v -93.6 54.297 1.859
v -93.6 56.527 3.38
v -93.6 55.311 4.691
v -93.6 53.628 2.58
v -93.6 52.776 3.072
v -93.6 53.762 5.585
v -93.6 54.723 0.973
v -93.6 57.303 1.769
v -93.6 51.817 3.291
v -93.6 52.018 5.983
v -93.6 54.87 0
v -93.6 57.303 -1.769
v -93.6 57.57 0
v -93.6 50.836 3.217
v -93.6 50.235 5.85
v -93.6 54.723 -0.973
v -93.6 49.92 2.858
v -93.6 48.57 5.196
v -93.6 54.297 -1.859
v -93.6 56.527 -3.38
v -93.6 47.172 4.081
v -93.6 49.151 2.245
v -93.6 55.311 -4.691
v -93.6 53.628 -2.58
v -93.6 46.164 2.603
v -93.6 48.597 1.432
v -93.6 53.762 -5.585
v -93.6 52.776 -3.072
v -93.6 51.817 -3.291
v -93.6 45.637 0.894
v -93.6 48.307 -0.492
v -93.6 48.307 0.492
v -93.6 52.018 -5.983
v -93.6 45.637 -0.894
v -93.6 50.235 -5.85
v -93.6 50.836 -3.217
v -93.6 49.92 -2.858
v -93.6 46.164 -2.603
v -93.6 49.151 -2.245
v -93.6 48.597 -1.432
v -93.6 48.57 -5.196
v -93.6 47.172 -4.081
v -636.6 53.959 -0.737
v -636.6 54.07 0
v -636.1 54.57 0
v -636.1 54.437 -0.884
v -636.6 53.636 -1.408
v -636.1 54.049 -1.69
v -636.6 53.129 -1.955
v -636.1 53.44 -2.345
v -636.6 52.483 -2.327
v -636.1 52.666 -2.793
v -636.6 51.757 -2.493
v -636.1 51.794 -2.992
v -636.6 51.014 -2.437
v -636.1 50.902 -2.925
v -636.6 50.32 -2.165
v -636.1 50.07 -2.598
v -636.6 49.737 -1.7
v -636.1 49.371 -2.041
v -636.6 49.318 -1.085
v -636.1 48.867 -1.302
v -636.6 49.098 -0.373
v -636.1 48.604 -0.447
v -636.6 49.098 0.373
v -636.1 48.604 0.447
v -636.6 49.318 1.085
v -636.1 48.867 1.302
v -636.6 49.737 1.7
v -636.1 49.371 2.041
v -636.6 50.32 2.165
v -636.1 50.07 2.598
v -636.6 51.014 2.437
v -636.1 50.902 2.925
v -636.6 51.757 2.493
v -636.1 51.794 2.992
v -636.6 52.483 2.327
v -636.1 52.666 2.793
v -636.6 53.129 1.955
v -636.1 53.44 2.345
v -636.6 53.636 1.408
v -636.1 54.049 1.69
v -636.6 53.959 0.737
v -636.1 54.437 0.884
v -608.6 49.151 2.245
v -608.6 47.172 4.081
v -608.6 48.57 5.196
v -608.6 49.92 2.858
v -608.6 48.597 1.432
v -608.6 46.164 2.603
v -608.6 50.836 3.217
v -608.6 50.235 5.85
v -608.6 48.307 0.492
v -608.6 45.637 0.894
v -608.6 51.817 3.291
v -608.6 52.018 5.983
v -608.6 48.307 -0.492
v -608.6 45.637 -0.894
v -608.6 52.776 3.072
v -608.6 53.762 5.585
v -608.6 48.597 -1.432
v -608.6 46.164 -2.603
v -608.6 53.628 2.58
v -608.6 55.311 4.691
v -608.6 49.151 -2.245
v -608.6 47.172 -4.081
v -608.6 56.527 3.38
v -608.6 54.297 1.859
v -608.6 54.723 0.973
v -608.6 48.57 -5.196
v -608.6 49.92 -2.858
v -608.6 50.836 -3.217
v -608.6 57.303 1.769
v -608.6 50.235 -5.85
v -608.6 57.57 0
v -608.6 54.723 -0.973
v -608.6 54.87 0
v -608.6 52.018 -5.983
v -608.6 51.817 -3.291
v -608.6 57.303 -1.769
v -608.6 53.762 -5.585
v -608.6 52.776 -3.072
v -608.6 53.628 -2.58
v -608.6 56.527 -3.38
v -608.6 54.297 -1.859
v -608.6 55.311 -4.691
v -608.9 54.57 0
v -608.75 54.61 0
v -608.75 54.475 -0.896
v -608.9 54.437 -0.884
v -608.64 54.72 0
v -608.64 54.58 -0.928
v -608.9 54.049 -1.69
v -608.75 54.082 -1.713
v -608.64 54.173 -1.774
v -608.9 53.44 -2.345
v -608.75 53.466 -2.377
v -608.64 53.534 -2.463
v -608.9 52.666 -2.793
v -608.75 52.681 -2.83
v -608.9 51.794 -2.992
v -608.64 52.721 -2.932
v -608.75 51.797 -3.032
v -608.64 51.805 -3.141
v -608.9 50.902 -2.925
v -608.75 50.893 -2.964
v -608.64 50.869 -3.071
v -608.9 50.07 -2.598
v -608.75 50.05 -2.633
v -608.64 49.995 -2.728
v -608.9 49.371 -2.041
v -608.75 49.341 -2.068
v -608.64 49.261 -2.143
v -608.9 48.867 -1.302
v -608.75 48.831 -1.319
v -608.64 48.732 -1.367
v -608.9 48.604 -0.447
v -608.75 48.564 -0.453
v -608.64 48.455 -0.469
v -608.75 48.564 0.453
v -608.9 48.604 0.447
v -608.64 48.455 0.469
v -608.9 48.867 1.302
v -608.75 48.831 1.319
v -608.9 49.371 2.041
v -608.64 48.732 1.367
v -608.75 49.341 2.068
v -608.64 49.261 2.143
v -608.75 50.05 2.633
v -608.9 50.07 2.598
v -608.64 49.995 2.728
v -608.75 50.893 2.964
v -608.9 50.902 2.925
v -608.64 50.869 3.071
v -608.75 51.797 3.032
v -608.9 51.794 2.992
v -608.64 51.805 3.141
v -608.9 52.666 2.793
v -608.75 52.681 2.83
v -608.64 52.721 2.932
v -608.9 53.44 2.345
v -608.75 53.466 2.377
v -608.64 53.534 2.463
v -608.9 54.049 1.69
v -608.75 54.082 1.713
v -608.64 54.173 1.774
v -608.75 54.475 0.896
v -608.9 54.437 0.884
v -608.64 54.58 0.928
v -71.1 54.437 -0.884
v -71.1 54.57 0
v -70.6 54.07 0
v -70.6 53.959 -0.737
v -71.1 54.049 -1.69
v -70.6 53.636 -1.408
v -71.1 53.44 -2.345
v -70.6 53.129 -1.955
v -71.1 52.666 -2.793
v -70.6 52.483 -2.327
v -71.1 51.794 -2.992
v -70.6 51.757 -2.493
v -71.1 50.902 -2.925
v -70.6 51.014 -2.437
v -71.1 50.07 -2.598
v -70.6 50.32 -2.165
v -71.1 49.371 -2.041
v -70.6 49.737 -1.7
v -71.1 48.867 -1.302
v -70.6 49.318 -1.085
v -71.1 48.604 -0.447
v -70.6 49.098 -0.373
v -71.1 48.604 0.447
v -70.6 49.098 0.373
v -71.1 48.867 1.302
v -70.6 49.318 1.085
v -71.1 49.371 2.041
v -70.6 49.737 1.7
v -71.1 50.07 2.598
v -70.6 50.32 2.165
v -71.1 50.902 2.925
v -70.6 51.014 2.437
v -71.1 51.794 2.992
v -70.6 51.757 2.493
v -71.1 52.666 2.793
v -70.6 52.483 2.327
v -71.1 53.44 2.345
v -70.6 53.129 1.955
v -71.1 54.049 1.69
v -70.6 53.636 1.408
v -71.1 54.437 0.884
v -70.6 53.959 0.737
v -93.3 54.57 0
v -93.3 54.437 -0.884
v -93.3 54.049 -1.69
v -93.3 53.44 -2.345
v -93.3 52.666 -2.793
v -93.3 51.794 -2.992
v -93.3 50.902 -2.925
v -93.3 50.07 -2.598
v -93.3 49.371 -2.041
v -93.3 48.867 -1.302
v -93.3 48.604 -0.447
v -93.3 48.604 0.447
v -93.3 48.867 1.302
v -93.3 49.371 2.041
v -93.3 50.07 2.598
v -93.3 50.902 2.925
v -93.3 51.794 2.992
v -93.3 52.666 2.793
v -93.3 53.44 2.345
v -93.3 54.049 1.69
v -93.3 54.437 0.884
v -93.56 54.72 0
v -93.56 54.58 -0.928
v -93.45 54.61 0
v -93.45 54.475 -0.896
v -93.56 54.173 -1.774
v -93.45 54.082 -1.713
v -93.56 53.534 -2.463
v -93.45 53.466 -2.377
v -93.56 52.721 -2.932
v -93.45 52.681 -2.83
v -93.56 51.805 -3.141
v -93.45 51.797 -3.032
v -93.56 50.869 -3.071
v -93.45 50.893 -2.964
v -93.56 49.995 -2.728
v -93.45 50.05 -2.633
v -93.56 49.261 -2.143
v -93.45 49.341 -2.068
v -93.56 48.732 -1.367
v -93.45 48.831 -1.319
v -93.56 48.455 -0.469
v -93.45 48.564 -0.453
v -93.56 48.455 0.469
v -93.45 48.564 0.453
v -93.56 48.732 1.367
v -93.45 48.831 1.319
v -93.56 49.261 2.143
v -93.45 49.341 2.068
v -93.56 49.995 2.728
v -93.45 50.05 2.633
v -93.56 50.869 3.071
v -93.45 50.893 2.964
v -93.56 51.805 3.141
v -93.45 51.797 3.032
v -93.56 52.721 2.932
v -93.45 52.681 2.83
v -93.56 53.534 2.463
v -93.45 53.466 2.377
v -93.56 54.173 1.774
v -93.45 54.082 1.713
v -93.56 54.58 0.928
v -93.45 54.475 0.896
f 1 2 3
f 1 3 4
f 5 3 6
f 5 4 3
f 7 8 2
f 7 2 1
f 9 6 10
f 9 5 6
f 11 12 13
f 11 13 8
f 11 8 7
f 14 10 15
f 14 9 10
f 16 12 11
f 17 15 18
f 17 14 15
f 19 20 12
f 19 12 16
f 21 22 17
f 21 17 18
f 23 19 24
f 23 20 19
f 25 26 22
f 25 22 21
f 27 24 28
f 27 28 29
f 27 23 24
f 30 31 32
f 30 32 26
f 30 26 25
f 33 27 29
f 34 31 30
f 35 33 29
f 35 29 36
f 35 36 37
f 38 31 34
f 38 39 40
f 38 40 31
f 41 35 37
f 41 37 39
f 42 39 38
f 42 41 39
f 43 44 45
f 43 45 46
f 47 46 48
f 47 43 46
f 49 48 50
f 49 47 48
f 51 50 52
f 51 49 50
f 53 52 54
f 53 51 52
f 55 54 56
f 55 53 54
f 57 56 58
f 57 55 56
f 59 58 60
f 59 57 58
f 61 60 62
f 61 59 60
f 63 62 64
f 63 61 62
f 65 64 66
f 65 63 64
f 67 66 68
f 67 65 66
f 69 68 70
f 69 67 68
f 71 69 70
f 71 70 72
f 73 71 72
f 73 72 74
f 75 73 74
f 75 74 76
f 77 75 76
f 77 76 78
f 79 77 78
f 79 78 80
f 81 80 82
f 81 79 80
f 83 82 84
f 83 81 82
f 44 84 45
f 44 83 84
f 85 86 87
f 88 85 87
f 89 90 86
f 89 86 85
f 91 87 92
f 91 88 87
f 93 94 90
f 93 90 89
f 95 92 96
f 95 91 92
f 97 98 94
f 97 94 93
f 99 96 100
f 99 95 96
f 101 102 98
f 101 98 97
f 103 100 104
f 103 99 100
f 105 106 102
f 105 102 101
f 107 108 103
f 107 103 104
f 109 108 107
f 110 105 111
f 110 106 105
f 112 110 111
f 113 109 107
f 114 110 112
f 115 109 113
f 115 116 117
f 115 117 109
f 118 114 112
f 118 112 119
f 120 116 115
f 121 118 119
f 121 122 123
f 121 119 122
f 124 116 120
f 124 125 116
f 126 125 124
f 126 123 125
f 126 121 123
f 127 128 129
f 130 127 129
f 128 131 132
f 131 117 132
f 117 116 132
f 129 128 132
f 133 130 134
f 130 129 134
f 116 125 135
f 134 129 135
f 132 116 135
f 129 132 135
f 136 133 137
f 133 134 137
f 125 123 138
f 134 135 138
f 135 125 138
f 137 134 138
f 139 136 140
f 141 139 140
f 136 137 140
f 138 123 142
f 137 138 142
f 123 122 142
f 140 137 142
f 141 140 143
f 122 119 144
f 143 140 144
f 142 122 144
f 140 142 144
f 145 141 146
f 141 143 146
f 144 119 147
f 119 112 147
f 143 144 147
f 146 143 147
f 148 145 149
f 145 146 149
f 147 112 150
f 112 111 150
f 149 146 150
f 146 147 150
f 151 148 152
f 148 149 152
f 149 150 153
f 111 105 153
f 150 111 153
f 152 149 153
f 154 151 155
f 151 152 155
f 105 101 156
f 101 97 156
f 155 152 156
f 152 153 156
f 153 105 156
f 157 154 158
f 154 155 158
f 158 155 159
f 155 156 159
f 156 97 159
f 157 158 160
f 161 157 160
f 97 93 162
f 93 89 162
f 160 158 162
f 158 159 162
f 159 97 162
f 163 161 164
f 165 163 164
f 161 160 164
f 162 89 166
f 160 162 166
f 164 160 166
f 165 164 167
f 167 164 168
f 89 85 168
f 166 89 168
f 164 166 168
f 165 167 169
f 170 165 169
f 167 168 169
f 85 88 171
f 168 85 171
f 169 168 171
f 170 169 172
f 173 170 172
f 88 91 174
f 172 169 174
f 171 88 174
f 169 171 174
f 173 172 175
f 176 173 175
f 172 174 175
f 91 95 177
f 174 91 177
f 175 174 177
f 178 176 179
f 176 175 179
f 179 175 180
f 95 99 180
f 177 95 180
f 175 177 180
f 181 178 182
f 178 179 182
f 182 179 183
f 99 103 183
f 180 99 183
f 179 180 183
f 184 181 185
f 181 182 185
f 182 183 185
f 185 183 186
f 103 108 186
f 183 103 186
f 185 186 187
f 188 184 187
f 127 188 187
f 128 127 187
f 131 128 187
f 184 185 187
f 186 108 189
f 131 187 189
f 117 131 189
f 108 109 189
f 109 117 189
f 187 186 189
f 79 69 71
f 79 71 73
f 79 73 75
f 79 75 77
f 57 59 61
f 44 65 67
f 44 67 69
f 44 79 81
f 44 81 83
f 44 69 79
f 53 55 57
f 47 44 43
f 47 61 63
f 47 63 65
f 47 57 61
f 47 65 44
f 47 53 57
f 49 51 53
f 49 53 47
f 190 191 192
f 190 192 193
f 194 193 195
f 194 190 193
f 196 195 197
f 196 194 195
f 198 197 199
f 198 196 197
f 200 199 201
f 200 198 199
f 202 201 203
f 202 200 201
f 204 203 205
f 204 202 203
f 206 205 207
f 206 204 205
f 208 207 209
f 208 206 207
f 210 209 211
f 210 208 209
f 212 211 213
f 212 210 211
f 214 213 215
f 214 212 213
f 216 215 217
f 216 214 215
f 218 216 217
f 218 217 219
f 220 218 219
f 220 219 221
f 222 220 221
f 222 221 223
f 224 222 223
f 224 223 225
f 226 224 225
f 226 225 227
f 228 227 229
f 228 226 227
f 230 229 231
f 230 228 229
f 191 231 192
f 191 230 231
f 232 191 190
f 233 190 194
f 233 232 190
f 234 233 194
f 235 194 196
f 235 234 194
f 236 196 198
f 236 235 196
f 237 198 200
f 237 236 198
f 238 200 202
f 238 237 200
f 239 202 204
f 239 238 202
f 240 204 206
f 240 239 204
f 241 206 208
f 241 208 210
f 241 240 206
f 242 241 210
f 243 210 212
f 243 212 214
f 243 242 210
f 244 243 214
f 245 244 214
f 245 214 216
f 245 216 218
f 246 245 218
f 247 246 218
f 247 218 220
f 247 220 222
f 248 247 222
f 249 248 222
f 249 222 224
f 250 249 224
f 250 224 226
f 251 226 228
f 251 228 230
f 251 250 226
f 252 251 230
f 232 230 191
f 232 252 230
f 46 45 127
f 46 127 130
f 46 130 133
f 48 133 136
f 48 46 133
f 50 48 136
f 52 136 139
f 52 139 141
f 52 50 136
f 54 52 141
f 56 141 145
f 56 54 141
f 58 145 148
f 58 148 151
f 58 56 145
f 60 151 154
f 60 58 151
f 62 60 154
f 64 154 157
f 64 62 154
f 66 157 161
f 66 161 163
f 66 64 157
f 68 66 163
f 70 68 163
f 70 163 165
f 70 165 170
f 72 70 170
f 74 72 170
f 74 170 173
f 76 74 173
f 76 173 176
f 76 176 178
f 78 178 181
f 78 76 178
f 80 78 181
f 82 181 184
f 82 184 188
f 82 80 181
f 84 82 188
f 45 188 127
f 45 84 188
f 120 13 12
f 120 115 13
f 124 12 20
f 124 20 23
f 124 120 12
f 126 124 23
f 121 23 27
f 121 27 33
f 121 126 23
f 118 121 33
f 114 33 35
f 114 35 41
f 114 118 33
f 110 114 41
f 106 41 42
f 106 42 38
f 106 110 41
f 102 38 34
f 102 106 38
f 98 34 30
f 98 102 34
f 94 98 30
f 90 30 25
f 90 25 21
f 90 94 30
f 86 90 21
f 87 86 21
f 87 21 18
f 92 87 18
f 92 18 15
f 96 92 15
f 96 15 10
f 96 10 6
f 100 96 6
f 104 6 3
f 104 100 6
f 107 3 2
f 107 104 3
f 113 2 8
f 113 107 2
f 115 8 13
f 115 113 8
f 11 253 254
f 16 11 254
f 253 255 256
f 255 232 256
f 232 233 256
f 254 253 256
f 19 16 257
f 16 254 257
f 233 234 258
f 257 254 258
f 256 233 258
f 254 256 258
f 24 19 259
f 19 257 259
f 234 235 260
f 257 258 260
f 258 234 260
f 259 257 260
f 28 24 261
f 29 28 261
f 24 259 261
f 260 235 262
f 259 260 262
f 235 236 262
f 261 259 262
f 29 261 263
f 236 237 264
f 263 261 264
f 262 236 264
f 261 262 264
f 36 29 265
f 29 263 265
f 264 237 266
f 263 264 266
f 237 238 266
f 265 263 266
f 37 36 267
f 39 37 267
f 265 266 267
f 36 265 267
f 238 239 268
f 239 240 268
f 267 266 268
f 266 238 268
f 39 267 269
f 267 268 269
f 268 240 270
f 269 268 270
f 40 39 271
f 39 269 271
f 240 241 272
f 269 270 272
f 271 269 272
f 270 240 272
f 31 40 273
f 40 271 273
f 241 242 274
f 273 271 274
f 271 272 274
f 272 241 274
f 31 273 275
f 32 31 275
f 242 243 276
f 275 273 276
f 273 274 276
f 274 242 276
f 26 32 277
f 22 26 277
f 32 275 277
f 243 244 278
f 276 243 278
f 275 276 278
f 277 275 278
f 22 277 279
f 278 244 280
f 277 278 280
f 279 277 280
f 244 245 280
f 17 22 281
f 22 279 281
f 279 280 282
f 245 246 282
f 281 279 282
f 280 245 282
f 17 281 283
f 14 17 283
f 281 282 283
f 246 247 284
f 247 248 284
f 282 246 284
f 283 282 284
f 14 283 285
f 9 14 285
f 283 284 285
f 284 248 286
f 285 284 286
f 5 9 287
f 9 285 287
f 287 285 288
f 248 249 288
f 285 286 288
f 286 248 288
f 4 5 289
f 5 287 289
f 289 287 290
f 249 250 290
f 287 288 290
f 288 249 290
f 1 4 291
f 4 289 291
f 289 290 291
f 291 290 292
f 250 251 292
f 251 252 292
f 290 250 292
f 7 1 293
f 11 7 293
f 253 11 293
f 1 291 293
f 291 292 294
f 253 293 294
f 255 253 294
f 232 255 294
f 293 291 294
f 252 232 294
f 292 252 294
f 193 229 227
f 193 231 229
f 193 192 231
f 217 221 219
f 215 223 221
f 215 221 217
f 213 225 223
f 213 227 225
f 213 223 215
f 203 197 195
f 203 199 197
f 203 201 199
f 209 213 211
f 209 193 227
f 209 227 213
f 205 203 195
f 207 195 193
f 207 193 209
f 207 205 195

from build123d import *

# Parameters (mm, degrees)
CHAMFER1_SIZE = 0.5
FILLET1_R     = 0.3


with BuildPart() as part:
    # Sketch1 → Revolve1 (revolve)
    with BuildSketch(Plane.XY):
        Polygon((-608.6, 54.57), (-636.6, 54.57), (-636.6, 51.57), (-70.6, 51.57), (-70.6, 54.57), (-93.6, 54.57), (-93.6, 57.57), (-608.6, 57.57), align=None)
    revolve(axis=Axis((-24.960657764, 51.57, 0), (-1, 0, 0)))

    # Chamfer1
    chamfer1_edges = [part.edges().sort_by_distance(p)[0] for p in [
        (-70.6, 48.57, 0),
        (-636.6, 48.57, 0),
    ]]
    chamfer(chamfer1_edges, length=CHAMFER1_SIZE)

    # Fillet1
    fillet1_edges = [part.edges().sort_by_distance(p)[0] for p in [
        (-93.6, 48.57, 0),
        (-608.6, 48.57, 0),
    ]]
    fillet(fillet1_edges, radius=FILLET1_R)


solid = part.part
